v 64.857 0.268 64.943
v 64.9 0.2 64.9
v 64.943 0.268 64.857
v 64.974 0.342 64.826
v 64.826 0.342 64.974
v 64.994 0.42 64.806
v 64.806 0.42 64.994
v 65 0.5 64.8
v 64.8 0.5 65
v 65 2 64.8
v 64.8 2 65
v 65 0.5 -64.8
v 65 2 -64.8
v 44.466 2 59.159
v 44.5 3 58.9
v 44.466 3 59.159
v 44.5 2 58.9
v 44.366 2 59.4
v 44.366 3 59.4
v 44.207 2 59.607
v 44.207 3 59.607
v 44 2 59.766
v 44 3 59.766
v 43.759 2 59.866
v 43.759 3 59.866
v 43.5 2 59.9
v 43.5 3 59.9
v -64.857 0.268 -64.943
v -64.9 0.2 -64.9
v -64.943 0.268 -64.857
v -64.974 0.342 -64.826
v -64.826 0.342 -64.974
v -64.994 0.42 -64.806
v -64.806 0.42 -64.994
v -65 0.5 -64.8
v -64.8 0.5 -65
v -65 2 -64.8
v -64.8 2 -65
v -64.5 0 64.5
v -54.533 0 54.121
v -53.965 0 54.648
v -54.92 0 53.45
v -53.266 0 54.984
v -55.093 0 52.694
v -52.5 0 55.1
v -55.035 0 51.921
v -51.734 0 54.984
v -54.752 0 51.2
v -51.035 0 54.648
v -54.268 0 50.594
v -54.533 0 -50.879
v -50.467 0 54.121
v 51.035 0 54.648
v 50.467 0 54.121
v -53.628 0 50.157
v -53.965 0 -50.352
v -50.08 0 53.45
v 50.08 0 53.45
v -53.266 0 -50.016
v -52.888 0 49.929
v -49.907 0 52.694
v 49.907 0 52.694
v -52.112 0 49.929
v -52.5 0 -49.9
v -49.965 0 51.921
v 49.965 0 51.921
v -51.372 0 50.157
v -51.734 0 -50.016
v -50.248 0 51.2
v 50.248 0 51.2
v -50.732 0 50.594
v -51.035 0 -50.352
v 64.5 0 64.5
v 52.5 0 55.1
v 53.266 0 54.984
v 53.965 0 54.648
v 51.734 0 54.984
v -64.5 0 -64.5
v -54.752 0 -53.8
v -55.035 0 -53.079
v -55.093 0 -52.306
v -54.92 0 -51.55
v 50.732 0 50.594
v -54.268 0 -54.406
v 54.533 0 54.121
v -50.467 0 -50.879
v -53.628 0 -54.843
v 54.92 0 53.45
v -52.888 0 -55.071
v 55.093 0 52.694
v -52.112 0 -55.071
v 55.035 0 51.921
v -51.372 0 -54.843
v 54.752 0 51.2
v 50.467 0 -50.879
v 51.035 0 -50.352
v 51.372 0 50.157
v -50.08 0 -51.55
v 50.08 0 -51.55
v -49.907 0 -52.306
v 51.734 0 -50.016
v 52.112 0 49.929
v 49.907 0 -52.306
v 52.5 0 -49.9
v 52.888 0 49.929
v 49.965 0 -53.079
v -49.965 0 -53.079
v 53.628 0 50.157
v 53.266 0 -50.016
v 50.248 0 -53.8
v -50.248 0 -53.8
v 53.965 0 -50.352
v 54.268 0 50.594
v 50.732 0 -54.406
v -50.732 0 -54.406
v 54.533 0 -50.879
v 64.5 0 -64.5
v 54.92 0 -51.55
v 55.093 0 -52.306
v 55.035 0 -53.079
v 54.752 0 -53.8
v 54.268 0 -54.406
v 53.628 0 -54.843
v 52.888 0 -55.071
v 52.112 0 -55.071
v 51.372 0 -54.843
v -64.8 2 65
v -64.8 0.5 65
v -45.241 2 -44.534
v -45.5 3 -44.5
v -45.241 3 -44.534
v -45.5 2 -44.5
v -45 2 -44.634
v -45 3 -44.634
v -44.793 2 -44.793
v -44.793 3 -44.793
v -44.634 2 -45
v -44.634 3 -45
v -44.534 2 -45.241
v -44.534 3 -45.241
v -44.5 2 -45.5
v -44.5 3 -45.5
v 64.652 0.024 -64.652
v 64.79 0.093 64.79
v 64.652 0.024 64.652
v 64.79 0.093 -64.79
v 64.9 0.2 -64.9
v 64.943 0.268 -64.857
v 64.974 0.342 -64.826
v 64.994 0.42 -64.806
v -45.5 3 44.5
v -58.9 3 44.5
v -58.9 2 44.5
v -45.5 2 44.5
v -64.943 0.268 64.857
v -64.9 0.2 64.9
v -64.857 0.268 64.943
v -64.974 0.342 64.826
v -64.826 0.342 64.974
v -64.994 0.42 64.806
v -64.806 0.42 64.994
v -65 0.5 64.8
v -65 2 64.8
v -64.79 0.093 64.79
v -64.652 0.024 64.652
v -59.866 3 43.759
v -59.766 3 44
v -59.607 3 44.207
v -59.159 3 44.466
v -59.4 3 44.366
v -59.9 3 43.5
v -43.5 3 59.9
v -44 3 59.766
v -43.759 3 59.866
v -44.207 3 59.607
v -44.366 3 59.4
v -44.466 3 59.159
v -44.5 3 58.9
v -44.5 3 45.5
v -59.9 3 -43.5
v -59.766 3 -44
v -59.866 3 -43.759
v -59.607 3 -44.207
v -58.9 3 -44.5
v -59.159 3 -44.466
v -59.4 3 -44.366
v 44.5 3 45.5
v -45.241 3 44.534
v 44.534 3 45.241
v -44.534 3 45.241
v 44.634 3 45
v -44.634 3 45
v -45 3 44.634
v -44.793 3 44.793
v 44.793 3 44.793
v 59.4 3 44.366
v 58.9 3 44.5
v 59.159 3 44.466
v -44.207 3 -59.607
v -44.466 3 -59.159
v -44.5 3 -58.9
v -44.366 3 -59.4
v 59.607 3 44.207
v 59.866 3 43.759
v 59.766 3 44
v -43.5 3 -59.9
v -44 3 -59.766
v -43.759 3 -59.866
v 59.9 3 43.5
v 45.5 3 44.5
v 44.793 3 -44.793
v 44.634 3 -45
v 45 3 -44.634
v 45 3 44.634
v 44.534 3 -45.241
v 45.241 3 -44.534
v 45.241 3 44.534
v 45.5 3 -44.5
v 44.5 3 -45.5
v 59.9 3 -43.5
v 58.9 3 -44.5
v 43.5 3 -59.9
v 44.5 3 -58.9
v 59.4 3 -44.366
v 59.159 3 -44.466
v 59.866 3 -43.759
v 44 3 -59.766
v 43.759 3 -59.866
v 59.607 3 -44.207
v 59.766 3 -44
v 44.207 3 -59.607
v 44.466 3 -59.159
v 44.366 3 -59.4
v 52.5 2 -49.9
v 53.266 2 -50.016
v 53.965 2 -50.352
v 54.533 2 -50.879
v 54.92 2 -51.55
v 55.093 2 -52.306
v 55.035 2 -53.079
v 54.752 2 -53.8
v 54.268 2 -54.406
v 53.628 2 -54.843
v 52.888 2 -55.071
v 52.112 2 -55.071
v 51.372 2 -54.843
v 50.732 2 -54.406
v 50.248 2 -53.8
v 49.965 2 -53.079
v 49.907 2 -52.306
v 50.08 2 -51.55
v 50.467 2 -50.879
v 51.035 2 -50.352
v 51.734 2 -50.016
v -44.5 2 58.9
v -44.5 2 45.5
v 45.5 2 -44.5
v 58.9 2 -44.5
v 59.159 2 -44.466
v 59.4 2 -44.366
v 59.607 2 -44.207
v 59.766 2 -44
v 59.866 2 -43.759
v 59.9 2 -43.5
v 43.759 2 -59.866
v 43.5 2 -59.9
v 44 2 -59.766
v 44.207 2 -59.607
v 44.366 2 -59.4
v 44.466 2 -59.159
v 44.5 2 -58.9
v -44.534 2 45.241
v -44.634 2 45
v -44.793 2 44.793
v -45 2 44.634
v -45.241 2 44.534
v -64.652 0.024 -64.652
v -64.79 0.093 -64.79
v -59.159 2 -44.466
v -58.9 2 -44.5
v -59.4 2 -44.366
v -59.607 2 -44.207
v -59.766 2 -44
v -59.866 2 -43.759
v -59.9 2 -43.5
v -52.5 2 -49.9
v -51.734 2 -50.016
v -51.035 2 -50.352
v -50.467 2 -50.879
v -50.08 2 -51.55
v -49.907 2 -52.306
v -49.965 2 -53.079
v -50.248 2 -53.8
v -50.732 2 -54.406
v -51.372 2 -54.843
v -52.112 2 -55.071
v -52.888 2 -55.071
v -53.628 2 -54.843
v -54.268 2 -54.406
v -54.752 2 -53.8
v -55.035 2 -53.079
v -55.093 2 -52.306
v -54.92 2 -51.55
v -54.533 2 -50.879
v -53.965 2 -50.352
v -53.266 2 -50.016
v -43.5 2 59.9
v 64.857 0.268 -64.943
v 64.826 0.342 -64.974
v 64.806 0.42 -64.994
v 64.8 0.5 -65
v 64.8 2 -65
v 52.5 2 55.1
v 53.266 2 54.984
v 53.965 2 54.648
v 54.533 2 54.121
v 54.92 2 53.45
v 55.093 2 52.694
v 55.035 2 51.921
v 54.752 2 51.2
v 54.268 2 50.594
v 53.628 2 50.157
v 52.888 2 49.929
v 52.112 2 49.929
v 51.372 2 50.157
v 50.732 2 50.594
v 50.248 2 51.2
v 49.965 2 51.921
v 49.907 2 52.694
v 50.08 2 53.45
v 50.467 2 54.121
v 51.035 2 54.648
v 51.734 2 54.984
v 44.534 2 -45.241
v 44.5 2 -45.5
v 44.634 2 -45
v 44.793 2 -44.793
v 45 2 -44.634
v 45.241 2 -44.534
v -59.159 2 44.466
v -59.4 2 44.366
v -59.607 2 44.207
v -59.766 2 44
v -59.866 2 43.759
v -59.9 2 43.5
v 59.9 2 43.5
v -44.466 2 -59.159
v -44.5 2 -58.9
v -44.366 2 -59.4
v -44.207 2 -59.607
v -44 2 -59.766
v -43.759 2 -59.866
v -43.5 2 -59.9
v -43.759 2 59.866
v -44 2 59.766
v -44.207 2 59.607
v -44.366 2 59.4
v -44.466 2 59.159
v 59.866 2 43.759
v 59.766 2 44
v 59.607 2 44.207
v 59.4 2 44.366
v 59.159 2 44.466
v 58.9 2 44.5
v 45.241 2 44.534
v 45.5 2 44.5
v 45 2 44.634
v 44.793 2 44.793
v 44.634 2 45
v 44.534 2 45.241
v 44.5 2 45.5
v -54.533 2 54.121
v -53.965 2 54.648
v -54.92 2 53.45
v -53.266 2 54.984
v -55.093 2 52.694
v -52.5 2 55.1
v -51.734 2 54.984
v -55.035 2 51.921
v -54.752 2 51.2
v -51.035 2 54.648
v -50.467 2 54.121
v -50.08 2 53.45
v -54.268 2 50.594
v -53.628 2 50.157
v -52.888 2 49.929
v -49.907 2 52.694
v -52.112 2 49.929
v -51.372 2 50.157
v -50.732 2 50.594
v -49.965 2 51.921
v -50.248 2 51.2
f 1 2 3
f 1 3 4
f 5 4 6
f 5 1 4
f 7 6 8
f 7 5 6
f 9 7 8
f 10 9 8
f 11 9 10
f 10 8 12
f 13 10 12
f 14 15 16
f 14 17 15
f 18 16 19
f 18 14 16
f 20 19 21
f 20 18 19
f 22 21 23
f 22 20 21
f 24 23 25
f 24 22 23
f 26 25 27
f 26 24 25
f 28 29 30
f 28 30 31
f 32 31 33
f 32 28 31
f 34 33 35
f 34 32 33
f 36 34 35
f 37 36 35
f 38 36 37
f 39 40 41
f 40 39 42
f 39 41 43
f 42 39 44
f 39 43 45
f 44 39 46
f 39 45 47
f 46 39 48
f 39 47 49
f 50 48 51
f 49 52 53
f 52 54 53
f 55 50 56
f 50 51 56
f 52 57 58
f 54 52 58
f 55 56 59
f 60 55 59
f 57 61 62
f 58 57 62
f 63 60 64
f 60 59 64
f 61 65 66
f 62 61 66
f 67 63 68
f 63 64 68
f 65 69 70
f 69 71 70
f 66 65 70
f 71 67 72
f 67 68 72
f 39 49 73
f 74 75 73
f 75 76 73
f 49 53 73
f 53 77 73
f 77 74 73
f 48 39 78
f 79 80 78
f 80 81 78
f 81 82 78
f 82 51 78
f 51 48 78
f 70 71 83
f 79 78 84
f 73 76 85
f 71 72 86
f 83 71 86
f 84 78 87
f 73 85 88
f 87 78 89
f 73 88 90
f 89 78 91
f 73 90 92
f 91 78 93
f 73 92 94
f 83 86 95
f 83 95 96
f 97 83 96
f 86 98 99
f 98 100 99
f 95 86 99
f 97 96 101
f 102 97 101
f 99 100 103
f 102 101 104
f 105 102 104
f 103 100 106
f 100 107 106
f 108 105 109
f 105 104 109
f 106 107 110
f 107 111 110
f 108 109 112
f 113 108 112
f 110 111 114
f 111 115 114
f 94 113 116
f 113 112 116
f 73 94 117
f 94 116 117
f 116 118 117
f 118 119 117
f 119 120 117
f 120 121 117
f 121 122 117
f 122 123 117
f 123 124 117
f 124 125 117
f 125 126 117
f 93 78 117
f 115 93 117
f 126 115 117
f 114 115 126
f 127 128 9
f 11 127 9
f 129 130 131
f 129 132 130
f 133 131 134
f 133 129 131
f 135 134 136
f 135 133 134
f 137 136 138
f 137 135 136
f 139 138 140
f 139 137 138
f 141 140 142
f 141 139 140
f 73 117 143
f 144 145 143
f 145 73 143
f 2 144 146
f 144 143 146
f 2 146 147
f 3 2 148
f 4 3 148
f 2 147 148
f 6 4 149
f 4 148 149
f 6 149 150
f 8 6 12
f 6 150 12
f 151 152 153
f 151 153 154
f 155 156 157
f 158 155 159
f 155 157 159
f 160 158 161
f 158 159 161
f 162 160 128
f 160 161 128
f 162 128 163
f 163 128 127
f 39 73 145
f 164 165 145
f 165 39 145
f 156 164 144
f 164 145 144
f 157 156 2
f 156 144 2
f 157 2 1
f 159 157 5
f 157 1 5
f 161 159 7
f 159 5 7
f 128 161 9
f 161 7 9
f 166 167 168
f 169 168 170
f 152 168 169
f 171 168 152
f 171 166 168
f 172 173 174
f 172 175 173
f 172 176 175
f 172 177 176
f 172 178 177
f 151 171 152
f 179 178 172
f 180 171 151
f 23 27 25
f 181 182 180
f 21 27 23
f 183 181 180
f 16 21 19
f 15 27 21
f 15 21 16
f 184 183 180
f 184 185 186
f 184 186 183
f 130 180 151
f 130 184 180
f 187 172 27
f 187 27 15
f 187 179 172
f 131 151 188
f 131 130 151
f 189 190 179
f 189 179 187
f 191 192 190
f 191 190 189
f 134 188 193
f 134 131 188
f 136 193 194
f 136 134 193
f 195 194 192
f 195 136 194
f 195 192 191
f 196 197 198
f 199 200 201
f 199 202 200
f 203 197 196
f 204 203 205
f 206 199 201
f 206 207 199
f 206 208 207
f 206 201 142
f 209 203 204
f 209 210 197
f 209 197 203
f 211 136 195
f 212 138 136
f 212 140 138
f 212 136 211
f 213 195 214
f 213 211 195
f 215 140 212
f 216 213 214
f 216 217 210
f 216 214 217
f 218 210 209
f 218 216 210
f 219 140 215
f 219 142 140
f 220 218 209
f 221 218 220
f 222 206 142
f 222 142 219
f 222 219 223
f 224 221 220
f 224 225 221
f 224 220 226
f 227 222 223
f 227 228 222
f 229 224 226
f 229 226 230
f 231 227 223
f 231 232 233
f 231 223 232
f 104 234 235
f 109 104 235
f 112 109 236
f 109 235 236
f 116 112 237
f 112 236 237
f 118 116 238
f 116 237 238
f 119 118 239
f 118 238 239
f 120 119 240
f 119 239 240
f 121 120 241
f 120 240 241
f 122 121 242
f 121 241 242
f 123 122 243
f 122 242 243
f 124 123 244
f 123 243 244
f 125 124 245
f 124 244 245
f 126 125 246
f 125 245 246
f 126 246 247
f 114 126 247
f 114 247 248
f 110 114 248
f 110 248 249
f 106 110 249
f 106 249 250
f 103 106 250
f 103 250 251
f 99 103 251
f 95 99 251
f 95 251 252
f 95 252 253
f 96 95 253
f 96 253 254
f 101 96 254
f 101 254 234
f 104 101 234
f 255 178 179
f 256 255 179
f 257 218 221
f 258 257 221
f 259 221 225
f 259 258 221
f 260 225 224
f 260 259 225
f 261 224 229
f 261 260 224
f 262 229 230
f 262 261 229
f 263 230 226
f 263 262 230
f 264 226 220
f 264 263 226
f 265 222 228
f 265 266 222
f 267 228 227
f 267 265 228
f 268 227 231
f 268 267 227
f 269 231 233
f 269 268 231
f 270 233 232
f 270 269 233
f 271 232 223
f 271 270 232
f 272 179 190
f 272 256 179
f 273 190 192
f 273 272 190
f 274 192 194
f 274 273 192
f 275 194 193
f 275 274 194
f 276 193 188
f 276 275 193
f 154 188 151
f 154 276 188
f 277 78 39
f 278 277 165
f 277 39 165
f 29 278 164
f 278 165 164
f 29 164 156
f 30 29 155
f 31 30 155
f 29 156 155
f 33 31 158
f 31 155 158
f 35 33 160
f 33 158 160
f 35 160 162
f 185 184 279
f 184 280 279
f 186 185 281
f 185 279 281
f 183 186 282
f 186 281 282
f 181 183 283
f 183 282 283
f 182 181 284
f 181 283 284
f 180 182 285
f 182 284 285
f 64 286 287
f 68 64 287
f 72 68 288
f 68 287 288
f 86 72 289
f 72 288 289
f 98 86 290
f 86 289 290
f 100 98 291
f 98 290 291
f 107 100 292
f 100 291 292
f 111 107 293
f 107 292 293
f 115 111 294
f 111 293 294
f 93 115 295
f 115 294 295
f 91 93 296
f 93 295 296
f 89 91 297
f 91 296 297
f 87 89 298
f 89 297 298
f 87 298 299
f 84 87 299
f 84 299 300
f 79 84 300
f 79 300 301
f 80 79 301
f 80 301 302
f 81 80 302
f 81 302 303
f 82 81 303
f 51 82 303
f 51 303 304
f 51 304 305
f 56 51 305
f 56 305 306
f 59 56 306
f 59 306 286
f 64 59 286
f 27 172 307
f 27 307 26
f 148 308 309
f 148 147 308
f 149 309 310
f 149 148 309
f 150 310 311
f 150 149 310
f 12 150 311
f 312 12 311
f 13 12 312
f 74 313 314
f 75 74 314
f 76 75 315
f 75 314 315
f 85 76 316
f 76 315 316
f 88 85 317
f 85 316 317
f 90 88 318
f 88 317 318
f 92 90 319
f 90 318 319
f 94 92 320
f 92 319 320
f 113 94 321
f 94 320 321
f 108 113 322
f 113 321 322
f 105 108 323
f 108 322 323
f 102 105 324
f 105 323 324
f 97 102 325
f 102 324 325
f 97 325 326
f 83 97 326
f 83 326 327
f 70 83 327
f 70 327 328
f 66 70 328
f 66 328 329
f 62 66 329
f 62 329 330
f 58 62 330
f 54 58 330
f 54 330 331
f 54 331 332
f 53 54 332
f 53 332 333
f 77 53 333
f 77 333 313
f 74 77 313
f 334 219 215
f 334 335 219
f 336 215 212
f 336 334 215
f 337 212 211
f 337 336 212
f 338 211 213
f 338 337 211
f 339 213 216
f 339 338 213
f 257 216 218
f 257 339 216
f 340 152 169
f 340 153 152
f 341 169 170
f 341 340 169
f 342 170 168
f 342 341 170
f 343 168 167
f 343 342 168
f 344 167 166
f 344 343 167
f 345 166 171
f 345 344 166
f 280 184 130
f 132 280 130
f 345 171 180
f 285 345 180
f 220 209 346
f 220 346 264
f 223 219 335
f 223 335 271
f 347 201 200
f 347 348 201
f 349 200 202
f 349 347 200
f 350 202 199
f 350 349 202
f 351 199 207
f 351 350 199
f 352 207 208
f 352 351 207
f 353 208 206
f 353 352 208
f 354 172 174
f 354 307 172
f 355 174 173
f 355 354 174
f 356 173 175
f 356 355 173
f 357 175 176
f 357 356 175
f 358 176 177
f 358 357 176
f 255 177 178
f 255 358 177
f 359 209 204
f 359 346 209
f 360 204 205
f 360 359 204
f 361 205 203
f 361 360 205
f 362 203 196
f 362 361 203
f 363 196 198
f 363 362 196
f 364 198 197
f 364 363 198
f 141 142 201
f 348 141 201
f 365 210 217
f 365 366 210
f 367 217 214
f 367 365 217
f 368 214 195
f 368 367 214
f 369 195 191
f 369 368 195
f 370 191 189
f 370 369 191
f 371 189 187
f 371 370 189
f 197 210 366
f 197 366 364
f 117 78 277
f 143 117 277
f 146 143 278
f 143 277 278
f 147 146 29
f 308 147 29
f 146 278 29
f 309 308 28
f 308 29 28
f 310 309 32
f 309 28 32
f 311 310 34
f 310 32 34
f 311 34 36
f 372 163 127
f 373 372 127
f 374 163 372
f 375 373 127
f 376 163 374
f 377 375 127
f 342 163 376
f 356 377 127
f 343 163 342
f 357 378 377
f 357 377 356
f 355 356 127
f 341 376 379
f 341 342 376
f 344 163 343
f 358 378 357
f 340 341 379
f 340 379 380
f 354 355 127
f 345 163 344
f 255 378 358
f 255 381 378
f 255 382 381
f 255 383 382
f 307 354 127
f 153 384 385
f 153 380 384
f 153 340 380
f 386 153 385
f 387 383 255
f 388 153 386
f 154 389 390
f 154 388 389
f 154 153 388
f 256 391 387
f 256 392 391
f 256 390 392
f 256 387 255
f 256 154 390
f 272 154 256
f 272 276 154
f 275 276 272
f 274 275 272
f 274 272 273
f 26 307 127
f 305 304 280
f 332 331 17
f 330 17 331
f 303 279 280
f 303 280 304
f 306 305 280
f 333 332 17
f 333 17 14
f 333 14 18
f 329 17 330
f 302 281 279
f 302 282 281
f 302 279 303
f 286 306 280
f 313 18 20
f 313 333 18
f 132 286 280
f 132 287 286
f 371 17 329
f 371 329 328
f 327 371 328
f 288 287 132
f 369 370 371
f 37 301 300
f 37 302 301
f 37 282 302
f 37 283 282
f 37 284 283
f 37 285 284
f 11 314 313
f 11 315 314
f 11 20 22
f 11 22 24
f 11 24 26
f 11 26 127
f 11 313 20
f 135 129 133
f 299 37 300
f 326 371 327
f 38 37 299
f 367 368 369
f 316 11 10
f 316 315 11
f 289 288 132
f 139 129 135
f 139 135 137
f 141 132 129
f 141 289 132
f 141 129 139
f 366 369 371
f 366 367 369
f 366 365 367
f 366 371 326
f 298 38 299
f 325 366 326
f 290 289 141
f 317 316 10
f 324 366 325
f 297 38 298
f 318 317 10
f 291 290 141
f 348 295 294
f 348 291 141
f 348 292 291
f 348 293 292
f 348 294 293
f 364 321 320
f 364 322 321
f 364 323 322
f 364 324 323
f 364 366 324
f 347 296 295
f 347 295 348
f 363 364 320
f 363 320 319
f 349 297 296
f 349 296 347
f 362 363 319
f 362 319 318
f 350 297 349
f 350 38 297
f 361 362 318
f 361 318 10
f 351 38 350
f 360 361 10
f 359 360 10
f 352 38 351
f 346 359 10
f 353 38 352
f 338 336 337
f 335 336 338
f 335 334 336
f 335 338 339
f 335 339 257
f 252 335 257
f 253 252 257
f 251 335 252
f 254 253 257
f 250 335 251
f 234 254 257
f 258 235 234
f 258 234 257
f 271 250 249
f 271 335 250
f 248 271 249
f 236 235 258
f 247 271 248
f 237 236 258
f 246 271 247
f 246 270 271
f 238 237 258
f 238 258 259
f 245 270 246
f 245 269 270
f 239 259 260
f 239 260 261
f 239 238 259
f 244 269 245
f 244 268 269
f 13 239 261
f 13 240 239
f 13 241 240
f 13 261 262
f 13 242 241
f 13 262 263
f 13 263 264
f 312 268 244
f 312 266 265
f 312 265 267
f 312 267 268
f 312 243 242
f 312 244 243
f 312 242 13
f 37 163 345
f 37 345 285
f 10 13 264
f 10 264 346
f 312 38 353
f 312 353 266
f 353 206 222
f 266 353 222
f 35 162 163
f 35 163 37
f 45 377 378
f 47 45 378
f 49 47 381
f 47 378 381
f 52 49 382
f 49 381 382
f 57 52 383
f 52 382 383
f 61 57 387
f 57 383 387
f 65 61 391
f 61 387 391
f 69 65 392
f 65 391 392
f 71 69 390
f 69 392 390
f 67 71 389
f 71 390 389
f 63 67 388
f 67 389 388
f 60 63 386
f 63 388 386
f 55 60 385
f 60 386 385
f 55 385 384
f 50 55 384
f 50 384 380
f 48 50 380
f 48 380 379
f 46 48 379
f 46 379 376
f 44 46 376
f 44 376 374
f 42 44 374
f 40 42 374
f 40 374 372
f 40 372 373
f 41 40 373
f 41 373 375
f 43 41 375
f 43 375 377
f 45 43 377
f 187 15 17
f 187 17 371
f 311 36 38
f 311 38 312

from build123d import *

# Parameters (mm, degrees)
SKETCH_1_W          = 130
SKETCH_1_H          = 130
EXTRUDE_1_DEPTH     = 3
SKETCH_2_R          = 2.6
CUT_EXTRUDE_1_DEPTH = 92.972822073
SKETCH_4_W          = 20.5
SKETCH_4_H          = 20.5
CUT_EXTRUDE_2_DEPTH = 1
SKETCH_5_W          = 89
SKETCH_5_H          = 5.1
SKETCH_5_W_2        = 5.1
SKETCH_5_H_2        = 89
CUT_EXTRUDE_3_DEPTH = 1
CHAMFER_1_SIZE      = 0.2
FILLET_1_R          = 0.5
FILLET_2_R          = 1


with BuildPart() as part:
    # 草图1 → 凸台-拉伸1 (new body)
    with BuildSketch(Plane(origin=(0, 0, 0), x_dir=(1, 0, 0), z_dir=(0, 1, 0))):
        Rectangle(SKETCH_1_W, SKETCH_1_H)
    extrude(amount=EXTRUDE_1_DEPTH)

    # 草图2 → 切除-拉伸1 (cut, through all)
    with BuildSketch(Plane(origin=(0, 3, 0), x_dir=(1, 0, 0), z_dir=(0, 1, 0))):
        with Locations(Location((52.5, 52.5, 0), (0, 0, 270))):
            Circle(SKETCH_2_R)
        with Locations(Location((52.5, -52.5, 0), (0, 0, 270))):
            Circle(SKETCH_2_R)
        with Locations(Location((-52.5, -52.5, 0), (0, 0, 270))):
            Circle(SKETCH_2_R)
        with Locations(Location((-52.5, 52.5, 0), (0, 0, 270))):
            Circle(SKETCH_2_R)
    extrude(amount=-CUT_EXTRUDE_1_DEPTH, mode=Mode.SUBTRACT)

    # 草图4 → 切除-拉伸2 (cut)
    with BuildSketch(Plane(origin=(0, 3, 0), x_dir=(1, 0, 0), z_dir=(0, 1, 0))):
        with Locations((54.75, 54.75)):
            Rectangle(SKETCH_4_W, SKETCH_4_H)
        with Locations((54.75, -54.75)):
            Rectangle(SKETCH_4_W, SKETCH_4_H)
        with Locations((-54.75, -54.75)):
            Rectangle(SKETCH_4_W, SKETCH_4_H)
        with Locations((-54.75, 54.75)):
            Rectangle(SKETCH_4_W, SKETCH_4_H)
    extrude(amount=-CUT_EXTRUDE_2_DEPTH, mode=Mode.SUBTRACT)

    # 草图5 → 切除-拉伸3 (cut)
    with BuildSketch(Plane(origin=(0, 3, 0), x_dir=(1, 0, 0), z_dir=(0, 1, 0))):
        with Locations((0, 62.45)):
            Rectangle(SKETCH_5_W, SKETCH_5_H)
        with Locations((62.45, 0)):
            Rectangle(SKETCH_5_W_2, SKETCH_5_H_2)
        with Locations((0, -62.45)):
            Rectangle(SKETCH_5_W, SKETCH_5_H)
        with Locations((-62.45, 0)):
            Rectangle(SKETCH_5_W_2, SKETCH_5_H_2)
    extrude(amount=-CUT_EXTRUDE_3_DEPTH, mode=Mode.SUBTRACT)

    # 倒角1
    chamfer_1_edges = [part.edges().sort_by_distance(p)[0] for p in [
        (65, 1, 65),
        (-65, 1, 65),
        (-65, 1, -65),
        (65, 1, -65),
    ]]
    chamfer(chamfer_1_edges, length=CHAMFER_1_SIZE)

    # 圆角1
    # the kernel refuses this fillet: 0.5 mm, written as the material it takes off along each edge
    with BuildSketch(Plane(origin=(-65, 0, 66.05), x_dir=(1, 0, 0), z_dir=(0, 0, -1)), Plane(origin=(66.05, 0, 65), x_dir=(0, 0, -1), z_dir=(-1, 0, 0)), Plane(origin=(65, 0, -66.05), x_dir=(-1, 0, 0), z_dir=(0, 0, 1))) as fillet_1_piece_1:
        with BuildLine():
            CenterArc((FILLET_1_R, -FILLET_1_R), FILLET_1_R, 90, 90)
            Line((0, -FILLET_1_R), (0, 0))
            Line((0, 0), (FILLET_1_R, 0))
        make_face()
    extrude(amount=132.1, mode=Mode.SUBTRACT)
    with BuildSketch(Plane(origin=(-66.05, 0, -65), x_dir=(0, 1, 0), z_dir=(1, 0, 0))) as fillet_1_piece_2:
        with BuildLine():
            CenterArc((FILLET_1_R, FILLET_1_R), FILLET_1_R, 180, 90)
            Line((0, FILLET_1_R), (0, 0))
            Line((0, 0), (FILLET_1_R, 0))
        make_face()
    extrude(amount=132.1, mode=Mode.SUBTRACT)

    # 圆角2
    fillet_2_edges = [part.edges().sort_by_distance(p)[0] for p in [
        (-44.5, 2.5, -59.9),
        (44.5, 2.5, -59.9),
        (59.9, 2.5, -44.5),
        (59.9, 2.5, 44.5),
        (44.5, 2.5, 59.9),
        (-44.5, 2.5, 59.9),
        (-59.9, 2.5, 44.5),
        (-59.9, 2.5, -44.5),
        (-44.5, 2.5, -44.5),
        (-44.5, 2.5, 44.5),
        (44.5, 2.5, 44.5),
        (44.5, 2.5, -44.5),
    ]]
    fillet(fillet_2_edges, radius=FILLET_2_R)


solid = part.part
